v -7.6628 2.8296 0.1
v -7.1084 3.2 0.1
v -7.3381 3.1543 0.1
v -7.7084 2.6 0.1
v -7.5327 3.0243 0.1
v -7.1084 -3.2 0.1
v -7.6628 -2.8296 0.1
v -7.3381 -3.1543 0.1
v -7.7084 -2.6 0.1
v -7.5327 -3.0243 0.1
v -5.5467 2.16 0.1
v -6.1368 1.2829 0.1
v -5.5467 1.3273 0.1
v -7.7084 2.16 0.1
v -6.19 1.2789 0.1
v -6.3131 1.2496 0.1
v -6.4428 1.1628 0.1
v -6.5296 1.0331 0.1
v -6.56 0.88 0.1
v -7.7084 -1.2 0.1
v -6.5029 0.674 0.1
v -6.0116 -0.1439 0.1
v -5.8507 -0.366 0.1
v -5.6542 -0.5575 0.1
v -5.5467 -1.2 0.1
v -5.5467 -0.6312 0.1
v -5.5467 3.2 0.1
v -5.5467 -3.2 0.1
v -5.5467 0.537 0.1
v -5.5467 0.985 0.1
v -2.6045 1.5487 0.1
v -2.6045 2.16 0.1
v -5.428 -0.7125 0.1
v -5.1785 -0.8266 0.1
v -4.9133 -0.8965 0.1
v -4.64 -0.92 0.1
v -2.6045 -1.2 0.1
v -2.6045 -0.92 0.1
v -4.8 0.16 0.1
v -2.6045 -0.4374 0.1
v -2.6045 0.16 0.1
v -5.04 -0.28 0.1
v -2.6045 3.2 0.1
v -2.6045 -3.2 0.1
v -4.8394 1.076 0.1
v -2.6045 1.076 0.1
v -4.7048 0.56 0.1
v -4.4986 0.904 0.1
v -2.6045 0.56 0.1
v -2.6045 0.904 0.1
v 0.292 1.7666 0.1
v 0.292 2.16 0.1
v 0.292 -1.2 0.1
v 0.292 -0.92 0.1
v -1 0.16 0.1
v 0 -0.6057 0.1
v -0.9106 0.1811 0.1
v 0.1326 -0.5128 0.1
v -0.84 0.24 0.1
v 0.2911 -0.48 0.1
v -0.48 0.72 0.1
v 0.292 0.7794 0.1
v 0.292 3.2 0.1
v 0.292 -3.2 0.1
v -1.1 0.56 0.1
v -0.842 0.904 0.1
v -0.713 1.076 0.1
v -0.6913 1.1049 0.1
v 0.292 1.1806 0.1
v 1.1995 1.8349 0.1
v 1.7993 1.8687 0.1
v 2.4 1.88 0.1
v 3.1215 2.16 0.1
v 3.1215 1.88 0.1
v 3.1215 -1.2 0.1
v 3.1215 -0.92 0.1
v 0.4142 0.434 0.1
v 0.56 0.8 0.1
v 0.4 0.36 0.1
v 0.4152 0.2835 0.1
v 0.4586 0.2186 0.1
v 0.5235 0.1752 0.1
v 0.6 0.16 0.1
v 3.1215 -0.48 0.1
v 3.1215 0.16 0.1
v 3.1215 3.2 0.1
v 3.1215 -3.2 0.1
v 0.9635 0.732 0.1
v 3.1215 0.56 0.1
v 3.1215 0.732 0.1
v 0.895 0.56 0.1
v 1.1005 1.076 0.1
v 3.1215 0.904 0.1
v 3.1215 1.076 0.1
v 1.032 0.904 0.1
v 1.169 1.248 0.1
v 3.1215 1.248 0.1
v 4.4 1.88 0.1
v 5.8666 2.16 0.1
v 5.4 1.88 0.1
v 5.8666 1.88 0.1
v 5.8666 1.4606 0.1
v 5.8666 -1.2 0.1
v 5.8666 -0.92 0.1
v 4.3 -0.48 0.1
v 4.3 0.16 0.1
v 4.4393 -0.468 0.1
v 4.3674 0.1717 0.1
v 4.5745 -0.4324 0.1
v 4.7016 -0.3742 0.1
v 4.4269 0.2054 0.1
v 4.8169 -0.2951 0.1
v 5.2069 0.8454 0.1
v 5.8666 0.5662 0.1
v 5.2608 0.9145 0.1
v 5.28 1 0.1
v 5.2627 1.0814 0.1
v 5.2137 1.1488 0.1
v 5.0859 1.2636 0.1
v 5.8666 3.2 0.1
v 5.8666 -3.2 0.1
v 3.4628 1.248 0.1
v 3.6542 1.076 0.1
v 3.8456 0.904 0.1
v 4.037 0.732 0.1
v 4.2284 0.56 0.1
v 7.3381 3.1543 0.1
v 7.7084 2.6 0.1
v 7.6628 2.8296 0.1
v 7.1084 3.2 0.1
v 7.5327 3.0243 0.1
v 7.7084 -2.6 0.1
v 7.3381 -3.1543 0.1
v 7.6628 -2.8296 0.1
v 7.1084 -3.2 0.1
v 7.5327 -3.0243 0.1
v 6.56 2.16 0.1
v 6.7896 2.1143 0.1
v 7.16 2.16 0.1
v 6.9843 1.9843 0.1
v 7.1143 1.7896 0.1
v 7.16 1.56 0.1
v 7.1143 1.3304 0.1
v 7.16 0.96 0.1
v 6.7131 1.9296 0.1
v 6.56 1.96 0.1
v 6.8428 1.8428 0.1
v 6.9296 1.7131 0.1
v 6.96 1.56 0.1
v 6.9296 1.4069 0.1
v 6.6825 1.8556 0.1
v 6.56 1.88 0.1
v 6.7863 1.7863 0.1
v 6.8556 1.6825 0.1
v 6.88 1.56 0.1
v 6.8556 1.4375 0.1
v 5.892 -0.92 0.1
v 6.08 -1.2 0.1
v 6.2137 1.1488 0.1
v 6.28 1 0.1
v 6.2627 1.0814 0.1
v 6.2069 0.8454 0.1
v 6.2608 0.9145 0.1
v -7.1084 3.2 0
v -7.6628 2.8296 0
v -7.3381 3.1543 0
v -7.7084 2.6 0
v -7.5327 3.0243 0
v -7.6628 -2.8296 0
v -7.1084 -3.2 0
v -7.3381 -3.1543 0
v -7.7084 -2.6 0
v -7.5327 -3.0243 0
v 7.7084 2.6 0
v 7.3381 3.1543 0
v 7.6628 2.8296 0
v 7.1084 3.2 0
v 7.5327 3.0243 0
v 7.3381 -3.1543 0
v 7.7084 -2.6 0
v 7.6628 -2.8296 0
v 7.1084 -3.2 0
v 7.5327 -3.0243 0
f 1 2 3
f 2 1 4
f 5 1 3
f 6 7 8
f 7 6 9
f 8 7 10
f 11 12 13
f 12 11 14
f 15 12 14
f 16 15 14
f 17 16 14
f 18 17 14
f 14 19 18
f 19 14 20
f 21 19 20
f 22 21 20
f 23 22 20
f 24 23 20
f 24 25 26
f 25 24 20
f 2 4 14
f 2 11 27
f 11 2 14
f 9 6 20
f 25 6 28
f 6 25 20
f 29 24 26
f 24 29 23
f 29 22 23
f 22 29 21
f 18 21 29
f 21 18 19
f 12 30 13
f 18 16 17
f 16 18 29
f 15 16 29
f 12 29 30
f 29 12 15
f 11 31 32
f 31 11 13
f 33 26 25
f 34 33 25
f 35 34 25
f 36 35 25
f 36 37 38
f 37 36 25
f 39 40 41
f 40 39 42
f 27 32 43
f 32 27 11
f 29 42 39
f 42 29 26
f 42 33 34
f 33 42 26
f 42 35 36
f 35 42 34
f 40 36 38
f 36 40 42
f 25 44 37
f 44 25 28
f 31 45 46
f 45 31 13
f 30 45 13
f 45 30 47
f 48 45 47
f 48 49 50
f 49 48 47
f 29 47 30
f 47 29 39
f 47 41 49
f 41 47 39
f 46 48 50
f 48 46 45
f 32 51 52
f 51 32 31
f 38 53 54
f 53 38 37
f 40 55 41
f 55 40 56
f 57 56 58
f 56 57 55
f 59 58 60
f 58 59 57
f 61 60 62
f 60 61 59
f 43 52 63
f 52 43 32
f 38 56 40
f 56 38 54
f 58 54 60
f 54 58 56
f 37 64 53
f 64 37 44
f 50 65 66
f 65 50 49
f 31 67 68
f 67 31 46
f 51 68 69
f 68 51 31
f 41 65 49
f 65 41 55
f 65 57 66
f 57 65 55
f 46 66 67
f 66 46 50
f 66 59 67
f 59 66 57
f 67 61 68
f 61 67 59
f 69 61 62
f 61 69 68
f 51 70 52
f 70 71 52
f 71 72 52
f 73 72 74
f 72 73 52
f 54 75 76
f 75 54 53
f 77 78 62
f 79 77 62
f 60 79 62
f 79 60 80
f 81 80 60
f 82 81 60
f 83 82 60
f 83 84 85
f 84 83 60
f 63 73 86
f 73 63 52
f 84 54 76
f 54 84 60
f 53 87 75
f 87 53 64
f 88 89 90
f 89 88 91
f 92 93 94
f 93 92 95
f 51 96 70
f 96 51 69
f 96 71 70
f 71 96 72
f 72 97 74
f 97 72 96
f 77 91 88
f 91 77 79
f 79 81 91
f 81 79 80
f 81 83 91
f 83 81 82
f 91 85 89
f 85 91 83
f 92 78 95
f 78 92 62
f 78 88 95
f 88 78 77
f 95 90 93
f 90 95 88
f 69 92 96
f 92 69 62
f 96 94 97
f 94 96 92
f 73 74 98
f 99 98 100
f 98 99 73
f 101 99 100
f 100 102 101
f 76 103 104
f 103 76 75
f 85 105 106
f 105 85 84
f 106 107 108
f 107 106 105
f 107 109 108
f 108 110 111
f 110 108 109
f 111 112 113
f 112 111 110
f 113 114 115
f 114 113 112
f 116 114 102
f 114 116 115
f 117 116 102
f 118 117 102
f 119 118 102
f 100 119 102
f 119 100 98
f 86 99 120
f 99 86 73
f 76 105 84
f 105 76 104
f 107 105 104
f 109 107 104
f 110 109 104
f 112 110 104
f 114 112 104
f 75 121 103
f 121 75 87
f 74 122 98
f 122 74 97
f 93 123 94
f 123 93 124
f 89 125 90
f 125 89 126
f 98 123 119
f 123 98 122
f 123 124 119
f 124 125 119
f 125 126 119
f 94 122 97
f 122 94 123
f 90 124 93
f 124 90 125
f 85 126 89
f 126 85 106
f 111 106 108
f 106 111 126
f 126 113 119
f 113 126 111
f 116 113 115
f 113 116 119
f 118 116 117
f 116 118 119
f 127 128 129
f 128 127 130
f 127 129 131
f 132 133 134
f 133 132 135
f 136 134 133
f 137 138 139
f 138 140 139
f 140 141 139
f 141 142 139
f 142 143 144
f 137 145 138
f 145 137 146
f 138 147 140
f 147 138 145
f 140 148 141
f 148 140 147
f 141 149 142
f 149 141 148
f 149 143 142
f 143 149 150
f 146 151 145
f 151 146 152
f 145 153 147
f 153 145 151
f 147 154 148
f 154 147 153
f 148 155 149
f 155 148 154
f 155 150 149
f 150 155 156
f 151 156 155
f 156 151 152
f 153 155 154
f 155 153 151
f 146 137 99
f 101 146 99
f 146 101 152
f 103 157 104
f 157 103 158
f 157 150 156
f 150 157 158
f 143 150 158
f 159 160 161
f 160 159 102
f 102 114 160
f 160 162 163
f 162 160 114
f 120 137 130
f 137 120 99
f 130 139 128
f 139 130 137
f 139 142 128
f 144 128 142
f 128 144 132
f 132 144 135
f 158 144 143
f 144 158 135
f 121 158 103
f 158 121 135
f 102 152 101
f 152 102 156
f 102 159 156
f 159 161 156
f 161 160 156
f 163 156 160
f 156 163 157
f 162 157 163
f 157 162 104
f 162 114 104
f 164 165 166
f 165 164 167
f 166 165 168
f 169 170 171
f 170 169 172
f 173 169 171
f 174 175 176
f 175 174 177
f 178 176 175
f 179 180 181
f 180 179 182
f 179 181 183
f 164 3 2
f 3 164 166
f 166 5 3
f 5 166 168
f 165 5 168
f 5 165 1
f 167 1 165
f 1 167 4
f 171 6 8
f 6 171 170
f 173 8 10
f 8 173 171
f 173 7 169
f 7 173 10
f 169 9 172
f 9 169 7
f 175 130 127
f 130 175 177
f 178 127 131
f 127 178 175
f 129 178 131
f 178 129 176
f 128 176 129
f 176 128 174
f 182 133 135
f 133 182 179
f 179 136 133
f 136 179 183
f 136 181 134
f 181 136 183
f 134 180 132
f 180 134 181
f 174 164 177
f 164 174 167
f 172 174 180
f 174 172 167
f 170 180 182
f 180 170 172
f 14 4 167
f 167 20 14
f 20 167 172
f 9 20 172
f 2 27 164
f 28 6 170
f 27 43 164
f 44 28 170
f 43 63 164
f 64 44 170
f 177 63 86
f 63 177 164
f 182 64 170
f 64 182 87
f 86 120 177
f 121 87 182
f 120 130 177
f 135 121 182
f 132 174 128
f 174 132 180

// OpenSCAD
use <../lib.scad>
use <6142617k.scad>
function ldraw_lib__6142617p() = [
// 0 Sticker  0.8 x  1.9 with Taillamp on Red Background Left (Needs work)
// 0 Name: 6142617p.dat
// 0 Author: Massimo Maso [Sirio]
// 0 !LDRAW_ORG Part UPDATE 2023-06
// 0 !LICENSE Licensed under CC BY 4.0 : see CAreadme.txt
// 
// 0 !HELP Needs work: Some parts should be halftones.
// 0 !HELP I indicated them as halftone color code disc - color code ndis.
// 0 !HELP For now I don't have enough information to create the matrix of dots.
// 
// 0 BFC CERTIFY CCW
  [0,"BFC","CERTIFY"],
  [0,"BFC","CCW"],
// 
// 0 !KEYWORDS Camaro, Chevrolet, Drag, Race, Set 75874, Speed Champions, SS
// 
// 0 !HISTORY 2023-11-19 [OrionP] Official Update 2023-06
// 
// 
// 1 16 0 0 0 -1 0 0 0 1 0 0 0 1 6142617k.dat
  [1,16,0,0,0,-1,0,0,0,1,0,0,0,1, ldraw_lib__6142617k()],
];
module ldraw_lib__6142617p(step=0, col=false, unit=2/5, alt=false, line=0.2, solid=!$preview)
    makepoly(ldraw_lib__6142617p(), step=step, col=col, unit=unit, alt=alt, line=line, solid=solid);
ldraw_lib__6142617p(line=0.2);
